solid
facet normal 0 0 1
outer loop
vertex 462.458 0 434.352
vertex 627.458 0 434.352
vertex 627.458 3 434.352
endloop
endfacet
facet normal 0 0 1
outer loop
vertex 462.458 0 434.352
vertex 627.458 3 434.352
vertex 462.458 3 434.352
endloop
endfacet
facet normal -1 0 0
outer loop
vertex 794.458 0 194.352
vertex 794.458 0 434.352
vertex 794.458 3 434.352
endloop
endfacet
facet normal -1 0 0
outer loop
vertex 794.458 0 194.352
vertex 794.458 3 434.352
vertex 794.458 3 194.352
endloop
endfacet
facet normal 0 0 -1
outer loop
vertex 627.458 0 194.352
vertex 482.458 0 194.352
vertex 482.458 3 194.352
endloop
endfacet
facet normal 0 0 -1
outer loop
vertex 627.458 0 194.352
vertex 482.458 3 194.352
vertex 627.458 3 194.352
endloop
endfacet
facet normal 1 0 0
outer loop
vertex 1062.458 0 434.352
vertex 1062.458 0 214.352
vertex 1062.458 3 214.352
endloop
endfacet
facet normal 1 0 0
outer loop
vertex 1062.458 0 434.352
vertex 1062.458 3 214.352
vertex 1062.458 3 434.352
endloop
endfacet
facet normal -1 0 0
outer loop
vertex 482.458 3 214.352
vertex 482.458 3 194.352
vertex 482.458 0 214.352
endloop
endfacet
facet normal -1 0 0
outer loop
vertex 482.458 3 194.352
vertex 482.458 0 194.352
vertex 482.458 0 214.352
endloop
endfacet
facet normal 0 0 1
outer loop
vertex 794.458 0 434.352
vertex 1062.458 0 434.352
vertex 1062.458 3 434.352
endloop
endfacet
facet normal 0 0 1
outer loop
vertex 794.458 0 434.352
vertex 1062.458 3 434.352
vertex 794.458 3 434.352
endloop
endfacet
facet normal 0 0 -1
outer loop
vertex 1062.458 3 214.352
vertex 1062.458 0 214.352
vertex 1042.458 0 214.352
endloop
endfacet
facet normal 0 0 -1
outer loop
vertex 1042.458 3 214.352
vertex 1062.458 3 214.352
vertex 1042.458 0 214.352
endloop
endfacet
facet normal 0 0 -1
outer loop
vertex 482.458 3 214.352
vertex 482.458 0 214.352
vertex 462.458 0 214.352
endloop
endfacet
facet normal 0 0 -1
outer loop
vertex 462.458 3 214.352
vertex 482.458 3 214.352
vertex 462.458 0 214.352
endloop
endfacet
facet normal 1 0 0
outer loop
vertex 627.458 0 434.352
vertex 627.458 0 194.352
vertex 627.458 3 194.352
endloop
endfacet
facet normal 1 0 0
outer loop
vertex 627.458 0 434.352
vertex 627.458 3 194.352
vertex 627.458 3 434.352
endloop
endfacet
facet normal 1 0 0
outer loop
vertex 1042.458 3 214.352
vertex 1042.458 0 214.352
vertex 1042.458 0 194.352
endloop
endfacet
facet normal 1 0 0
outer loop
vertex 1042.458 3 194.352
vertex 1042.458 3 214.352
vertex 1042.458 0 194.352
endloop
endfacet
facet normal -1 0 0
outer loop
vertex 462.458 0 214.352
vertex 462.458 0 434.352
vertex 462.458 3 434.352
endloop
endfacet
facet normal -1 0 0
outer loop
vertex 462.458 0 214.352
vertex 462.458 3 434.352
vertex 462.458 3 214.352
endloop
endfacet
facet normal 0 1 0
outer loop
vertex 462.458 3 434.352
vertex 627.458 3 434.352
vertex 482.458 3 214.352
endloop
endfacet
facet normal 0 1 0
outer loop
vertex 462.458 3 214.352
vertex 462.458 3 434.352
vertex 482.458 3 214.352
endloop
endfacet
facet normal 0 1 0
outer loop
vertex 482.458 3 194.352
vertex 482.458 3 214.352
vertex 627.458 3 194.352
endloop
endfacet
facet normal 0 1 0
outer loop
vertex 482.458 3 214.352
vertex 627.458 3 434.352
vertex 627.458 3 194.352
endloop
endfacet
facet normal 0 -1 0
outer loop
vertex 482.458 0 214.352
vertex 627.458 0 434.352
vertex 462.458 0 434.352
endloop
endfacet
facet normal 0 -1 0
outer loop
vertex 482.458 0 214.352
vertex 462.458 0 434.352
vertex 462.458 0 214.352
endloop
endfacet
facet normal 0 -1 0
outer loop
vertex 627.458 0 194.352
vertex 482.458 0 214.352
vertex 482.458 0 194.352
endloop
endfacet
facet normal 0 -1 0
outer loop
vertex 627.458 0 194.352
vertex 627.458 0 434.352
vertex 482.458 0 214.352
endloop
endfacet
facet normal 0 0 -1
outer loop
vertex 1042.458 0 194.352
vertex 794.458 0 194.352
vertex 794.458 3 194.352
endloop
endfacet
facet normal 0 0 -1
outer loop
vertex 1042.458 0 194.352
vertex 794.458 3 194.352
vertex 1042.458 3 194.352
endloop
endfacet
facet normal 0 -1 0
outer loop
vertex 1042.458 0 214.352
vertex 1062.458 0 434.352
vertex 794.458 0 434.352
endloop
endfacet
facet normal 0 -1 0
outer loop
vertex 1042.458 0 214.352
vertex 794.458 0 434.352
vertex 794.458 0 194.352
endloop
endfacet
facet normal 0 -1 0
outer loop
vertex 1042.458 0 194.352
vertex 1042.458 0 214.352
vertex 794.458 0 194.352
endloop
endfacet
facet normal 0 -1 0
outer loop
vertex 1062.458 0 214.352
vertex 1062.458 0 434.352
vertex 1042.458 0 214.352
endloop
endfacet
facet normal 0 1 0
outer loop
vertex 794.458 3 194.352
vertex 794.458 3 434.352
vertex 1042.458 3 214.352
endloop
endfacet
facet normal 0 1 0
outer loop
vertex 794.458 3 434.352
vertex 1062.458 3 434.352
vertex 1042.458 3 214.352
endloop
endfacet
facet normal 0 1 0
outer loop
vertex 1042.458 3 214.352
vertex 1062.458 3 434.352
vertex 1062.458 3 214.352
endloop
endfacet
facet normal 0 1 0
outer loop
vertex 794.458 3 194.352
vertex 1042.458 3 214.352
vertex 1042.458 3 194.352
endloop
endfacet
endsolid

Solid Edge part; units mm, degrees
sketch "Sketch1" plane through (0, 0, 0) normal (0, -1, 0) x (1, 0, 0)
  line L0 (462.4585, 434.3522) -> (462.4585, 194.3522)
  line L1 (462.4585, 194.3522) -> (1062.4585, 194.3522)
  line L2 (1062.4585, 194.3522) -> (1062.4585, 434.3522)
  line L3 (1062.4585, 434.3522) -> (462.4585, 434.3522)
  dimension "D1" = 600
  dimension "D2" = 240
extrude "Protrusion1" add sketch "Sketch1" against normal blind 3
sketch "Sketch2" plane through (762.4585, 0, 314.3522) normal (0, -1, 0) x (1, 0, 0)
  line L0 (300, -100) -> (280, -100)
  line L1 (280, -100) -> (280, -120)
  line L2 (280, -120) -> (300, -120)
  line L3 (300, -120) -> (300, -100)
  line L4 (-300, -120) -> (-280, -120)
  line L5 (-280, -120) -> (-280, -100)
  line L6 (-280, -100) -> (-300, -100)
  line L7 (-300, -100) -> (-300, -120)
  dimension "D1" = 20
  dimension "D2" = 20
  dimension "D3" = 20
  dimension "D4" = 20
extrude "Cutout1" cut sketch "Sketch2" against normal through all
sketch "Sketch3" plane through (762.4585, 0, 314.3522) normal (0, -1, 0) x (1, 0, 0)
  line L0 (-135, -120) -> (-135, 120)
  line L1 (-135, 120) -> (32, 120)
  line L2 (32, 120) -> (32, -120)
  line L3 (32, -120) -> (-135, -120)
extrude "Cutout2" cut sketch "Sketch3" against normal through all
